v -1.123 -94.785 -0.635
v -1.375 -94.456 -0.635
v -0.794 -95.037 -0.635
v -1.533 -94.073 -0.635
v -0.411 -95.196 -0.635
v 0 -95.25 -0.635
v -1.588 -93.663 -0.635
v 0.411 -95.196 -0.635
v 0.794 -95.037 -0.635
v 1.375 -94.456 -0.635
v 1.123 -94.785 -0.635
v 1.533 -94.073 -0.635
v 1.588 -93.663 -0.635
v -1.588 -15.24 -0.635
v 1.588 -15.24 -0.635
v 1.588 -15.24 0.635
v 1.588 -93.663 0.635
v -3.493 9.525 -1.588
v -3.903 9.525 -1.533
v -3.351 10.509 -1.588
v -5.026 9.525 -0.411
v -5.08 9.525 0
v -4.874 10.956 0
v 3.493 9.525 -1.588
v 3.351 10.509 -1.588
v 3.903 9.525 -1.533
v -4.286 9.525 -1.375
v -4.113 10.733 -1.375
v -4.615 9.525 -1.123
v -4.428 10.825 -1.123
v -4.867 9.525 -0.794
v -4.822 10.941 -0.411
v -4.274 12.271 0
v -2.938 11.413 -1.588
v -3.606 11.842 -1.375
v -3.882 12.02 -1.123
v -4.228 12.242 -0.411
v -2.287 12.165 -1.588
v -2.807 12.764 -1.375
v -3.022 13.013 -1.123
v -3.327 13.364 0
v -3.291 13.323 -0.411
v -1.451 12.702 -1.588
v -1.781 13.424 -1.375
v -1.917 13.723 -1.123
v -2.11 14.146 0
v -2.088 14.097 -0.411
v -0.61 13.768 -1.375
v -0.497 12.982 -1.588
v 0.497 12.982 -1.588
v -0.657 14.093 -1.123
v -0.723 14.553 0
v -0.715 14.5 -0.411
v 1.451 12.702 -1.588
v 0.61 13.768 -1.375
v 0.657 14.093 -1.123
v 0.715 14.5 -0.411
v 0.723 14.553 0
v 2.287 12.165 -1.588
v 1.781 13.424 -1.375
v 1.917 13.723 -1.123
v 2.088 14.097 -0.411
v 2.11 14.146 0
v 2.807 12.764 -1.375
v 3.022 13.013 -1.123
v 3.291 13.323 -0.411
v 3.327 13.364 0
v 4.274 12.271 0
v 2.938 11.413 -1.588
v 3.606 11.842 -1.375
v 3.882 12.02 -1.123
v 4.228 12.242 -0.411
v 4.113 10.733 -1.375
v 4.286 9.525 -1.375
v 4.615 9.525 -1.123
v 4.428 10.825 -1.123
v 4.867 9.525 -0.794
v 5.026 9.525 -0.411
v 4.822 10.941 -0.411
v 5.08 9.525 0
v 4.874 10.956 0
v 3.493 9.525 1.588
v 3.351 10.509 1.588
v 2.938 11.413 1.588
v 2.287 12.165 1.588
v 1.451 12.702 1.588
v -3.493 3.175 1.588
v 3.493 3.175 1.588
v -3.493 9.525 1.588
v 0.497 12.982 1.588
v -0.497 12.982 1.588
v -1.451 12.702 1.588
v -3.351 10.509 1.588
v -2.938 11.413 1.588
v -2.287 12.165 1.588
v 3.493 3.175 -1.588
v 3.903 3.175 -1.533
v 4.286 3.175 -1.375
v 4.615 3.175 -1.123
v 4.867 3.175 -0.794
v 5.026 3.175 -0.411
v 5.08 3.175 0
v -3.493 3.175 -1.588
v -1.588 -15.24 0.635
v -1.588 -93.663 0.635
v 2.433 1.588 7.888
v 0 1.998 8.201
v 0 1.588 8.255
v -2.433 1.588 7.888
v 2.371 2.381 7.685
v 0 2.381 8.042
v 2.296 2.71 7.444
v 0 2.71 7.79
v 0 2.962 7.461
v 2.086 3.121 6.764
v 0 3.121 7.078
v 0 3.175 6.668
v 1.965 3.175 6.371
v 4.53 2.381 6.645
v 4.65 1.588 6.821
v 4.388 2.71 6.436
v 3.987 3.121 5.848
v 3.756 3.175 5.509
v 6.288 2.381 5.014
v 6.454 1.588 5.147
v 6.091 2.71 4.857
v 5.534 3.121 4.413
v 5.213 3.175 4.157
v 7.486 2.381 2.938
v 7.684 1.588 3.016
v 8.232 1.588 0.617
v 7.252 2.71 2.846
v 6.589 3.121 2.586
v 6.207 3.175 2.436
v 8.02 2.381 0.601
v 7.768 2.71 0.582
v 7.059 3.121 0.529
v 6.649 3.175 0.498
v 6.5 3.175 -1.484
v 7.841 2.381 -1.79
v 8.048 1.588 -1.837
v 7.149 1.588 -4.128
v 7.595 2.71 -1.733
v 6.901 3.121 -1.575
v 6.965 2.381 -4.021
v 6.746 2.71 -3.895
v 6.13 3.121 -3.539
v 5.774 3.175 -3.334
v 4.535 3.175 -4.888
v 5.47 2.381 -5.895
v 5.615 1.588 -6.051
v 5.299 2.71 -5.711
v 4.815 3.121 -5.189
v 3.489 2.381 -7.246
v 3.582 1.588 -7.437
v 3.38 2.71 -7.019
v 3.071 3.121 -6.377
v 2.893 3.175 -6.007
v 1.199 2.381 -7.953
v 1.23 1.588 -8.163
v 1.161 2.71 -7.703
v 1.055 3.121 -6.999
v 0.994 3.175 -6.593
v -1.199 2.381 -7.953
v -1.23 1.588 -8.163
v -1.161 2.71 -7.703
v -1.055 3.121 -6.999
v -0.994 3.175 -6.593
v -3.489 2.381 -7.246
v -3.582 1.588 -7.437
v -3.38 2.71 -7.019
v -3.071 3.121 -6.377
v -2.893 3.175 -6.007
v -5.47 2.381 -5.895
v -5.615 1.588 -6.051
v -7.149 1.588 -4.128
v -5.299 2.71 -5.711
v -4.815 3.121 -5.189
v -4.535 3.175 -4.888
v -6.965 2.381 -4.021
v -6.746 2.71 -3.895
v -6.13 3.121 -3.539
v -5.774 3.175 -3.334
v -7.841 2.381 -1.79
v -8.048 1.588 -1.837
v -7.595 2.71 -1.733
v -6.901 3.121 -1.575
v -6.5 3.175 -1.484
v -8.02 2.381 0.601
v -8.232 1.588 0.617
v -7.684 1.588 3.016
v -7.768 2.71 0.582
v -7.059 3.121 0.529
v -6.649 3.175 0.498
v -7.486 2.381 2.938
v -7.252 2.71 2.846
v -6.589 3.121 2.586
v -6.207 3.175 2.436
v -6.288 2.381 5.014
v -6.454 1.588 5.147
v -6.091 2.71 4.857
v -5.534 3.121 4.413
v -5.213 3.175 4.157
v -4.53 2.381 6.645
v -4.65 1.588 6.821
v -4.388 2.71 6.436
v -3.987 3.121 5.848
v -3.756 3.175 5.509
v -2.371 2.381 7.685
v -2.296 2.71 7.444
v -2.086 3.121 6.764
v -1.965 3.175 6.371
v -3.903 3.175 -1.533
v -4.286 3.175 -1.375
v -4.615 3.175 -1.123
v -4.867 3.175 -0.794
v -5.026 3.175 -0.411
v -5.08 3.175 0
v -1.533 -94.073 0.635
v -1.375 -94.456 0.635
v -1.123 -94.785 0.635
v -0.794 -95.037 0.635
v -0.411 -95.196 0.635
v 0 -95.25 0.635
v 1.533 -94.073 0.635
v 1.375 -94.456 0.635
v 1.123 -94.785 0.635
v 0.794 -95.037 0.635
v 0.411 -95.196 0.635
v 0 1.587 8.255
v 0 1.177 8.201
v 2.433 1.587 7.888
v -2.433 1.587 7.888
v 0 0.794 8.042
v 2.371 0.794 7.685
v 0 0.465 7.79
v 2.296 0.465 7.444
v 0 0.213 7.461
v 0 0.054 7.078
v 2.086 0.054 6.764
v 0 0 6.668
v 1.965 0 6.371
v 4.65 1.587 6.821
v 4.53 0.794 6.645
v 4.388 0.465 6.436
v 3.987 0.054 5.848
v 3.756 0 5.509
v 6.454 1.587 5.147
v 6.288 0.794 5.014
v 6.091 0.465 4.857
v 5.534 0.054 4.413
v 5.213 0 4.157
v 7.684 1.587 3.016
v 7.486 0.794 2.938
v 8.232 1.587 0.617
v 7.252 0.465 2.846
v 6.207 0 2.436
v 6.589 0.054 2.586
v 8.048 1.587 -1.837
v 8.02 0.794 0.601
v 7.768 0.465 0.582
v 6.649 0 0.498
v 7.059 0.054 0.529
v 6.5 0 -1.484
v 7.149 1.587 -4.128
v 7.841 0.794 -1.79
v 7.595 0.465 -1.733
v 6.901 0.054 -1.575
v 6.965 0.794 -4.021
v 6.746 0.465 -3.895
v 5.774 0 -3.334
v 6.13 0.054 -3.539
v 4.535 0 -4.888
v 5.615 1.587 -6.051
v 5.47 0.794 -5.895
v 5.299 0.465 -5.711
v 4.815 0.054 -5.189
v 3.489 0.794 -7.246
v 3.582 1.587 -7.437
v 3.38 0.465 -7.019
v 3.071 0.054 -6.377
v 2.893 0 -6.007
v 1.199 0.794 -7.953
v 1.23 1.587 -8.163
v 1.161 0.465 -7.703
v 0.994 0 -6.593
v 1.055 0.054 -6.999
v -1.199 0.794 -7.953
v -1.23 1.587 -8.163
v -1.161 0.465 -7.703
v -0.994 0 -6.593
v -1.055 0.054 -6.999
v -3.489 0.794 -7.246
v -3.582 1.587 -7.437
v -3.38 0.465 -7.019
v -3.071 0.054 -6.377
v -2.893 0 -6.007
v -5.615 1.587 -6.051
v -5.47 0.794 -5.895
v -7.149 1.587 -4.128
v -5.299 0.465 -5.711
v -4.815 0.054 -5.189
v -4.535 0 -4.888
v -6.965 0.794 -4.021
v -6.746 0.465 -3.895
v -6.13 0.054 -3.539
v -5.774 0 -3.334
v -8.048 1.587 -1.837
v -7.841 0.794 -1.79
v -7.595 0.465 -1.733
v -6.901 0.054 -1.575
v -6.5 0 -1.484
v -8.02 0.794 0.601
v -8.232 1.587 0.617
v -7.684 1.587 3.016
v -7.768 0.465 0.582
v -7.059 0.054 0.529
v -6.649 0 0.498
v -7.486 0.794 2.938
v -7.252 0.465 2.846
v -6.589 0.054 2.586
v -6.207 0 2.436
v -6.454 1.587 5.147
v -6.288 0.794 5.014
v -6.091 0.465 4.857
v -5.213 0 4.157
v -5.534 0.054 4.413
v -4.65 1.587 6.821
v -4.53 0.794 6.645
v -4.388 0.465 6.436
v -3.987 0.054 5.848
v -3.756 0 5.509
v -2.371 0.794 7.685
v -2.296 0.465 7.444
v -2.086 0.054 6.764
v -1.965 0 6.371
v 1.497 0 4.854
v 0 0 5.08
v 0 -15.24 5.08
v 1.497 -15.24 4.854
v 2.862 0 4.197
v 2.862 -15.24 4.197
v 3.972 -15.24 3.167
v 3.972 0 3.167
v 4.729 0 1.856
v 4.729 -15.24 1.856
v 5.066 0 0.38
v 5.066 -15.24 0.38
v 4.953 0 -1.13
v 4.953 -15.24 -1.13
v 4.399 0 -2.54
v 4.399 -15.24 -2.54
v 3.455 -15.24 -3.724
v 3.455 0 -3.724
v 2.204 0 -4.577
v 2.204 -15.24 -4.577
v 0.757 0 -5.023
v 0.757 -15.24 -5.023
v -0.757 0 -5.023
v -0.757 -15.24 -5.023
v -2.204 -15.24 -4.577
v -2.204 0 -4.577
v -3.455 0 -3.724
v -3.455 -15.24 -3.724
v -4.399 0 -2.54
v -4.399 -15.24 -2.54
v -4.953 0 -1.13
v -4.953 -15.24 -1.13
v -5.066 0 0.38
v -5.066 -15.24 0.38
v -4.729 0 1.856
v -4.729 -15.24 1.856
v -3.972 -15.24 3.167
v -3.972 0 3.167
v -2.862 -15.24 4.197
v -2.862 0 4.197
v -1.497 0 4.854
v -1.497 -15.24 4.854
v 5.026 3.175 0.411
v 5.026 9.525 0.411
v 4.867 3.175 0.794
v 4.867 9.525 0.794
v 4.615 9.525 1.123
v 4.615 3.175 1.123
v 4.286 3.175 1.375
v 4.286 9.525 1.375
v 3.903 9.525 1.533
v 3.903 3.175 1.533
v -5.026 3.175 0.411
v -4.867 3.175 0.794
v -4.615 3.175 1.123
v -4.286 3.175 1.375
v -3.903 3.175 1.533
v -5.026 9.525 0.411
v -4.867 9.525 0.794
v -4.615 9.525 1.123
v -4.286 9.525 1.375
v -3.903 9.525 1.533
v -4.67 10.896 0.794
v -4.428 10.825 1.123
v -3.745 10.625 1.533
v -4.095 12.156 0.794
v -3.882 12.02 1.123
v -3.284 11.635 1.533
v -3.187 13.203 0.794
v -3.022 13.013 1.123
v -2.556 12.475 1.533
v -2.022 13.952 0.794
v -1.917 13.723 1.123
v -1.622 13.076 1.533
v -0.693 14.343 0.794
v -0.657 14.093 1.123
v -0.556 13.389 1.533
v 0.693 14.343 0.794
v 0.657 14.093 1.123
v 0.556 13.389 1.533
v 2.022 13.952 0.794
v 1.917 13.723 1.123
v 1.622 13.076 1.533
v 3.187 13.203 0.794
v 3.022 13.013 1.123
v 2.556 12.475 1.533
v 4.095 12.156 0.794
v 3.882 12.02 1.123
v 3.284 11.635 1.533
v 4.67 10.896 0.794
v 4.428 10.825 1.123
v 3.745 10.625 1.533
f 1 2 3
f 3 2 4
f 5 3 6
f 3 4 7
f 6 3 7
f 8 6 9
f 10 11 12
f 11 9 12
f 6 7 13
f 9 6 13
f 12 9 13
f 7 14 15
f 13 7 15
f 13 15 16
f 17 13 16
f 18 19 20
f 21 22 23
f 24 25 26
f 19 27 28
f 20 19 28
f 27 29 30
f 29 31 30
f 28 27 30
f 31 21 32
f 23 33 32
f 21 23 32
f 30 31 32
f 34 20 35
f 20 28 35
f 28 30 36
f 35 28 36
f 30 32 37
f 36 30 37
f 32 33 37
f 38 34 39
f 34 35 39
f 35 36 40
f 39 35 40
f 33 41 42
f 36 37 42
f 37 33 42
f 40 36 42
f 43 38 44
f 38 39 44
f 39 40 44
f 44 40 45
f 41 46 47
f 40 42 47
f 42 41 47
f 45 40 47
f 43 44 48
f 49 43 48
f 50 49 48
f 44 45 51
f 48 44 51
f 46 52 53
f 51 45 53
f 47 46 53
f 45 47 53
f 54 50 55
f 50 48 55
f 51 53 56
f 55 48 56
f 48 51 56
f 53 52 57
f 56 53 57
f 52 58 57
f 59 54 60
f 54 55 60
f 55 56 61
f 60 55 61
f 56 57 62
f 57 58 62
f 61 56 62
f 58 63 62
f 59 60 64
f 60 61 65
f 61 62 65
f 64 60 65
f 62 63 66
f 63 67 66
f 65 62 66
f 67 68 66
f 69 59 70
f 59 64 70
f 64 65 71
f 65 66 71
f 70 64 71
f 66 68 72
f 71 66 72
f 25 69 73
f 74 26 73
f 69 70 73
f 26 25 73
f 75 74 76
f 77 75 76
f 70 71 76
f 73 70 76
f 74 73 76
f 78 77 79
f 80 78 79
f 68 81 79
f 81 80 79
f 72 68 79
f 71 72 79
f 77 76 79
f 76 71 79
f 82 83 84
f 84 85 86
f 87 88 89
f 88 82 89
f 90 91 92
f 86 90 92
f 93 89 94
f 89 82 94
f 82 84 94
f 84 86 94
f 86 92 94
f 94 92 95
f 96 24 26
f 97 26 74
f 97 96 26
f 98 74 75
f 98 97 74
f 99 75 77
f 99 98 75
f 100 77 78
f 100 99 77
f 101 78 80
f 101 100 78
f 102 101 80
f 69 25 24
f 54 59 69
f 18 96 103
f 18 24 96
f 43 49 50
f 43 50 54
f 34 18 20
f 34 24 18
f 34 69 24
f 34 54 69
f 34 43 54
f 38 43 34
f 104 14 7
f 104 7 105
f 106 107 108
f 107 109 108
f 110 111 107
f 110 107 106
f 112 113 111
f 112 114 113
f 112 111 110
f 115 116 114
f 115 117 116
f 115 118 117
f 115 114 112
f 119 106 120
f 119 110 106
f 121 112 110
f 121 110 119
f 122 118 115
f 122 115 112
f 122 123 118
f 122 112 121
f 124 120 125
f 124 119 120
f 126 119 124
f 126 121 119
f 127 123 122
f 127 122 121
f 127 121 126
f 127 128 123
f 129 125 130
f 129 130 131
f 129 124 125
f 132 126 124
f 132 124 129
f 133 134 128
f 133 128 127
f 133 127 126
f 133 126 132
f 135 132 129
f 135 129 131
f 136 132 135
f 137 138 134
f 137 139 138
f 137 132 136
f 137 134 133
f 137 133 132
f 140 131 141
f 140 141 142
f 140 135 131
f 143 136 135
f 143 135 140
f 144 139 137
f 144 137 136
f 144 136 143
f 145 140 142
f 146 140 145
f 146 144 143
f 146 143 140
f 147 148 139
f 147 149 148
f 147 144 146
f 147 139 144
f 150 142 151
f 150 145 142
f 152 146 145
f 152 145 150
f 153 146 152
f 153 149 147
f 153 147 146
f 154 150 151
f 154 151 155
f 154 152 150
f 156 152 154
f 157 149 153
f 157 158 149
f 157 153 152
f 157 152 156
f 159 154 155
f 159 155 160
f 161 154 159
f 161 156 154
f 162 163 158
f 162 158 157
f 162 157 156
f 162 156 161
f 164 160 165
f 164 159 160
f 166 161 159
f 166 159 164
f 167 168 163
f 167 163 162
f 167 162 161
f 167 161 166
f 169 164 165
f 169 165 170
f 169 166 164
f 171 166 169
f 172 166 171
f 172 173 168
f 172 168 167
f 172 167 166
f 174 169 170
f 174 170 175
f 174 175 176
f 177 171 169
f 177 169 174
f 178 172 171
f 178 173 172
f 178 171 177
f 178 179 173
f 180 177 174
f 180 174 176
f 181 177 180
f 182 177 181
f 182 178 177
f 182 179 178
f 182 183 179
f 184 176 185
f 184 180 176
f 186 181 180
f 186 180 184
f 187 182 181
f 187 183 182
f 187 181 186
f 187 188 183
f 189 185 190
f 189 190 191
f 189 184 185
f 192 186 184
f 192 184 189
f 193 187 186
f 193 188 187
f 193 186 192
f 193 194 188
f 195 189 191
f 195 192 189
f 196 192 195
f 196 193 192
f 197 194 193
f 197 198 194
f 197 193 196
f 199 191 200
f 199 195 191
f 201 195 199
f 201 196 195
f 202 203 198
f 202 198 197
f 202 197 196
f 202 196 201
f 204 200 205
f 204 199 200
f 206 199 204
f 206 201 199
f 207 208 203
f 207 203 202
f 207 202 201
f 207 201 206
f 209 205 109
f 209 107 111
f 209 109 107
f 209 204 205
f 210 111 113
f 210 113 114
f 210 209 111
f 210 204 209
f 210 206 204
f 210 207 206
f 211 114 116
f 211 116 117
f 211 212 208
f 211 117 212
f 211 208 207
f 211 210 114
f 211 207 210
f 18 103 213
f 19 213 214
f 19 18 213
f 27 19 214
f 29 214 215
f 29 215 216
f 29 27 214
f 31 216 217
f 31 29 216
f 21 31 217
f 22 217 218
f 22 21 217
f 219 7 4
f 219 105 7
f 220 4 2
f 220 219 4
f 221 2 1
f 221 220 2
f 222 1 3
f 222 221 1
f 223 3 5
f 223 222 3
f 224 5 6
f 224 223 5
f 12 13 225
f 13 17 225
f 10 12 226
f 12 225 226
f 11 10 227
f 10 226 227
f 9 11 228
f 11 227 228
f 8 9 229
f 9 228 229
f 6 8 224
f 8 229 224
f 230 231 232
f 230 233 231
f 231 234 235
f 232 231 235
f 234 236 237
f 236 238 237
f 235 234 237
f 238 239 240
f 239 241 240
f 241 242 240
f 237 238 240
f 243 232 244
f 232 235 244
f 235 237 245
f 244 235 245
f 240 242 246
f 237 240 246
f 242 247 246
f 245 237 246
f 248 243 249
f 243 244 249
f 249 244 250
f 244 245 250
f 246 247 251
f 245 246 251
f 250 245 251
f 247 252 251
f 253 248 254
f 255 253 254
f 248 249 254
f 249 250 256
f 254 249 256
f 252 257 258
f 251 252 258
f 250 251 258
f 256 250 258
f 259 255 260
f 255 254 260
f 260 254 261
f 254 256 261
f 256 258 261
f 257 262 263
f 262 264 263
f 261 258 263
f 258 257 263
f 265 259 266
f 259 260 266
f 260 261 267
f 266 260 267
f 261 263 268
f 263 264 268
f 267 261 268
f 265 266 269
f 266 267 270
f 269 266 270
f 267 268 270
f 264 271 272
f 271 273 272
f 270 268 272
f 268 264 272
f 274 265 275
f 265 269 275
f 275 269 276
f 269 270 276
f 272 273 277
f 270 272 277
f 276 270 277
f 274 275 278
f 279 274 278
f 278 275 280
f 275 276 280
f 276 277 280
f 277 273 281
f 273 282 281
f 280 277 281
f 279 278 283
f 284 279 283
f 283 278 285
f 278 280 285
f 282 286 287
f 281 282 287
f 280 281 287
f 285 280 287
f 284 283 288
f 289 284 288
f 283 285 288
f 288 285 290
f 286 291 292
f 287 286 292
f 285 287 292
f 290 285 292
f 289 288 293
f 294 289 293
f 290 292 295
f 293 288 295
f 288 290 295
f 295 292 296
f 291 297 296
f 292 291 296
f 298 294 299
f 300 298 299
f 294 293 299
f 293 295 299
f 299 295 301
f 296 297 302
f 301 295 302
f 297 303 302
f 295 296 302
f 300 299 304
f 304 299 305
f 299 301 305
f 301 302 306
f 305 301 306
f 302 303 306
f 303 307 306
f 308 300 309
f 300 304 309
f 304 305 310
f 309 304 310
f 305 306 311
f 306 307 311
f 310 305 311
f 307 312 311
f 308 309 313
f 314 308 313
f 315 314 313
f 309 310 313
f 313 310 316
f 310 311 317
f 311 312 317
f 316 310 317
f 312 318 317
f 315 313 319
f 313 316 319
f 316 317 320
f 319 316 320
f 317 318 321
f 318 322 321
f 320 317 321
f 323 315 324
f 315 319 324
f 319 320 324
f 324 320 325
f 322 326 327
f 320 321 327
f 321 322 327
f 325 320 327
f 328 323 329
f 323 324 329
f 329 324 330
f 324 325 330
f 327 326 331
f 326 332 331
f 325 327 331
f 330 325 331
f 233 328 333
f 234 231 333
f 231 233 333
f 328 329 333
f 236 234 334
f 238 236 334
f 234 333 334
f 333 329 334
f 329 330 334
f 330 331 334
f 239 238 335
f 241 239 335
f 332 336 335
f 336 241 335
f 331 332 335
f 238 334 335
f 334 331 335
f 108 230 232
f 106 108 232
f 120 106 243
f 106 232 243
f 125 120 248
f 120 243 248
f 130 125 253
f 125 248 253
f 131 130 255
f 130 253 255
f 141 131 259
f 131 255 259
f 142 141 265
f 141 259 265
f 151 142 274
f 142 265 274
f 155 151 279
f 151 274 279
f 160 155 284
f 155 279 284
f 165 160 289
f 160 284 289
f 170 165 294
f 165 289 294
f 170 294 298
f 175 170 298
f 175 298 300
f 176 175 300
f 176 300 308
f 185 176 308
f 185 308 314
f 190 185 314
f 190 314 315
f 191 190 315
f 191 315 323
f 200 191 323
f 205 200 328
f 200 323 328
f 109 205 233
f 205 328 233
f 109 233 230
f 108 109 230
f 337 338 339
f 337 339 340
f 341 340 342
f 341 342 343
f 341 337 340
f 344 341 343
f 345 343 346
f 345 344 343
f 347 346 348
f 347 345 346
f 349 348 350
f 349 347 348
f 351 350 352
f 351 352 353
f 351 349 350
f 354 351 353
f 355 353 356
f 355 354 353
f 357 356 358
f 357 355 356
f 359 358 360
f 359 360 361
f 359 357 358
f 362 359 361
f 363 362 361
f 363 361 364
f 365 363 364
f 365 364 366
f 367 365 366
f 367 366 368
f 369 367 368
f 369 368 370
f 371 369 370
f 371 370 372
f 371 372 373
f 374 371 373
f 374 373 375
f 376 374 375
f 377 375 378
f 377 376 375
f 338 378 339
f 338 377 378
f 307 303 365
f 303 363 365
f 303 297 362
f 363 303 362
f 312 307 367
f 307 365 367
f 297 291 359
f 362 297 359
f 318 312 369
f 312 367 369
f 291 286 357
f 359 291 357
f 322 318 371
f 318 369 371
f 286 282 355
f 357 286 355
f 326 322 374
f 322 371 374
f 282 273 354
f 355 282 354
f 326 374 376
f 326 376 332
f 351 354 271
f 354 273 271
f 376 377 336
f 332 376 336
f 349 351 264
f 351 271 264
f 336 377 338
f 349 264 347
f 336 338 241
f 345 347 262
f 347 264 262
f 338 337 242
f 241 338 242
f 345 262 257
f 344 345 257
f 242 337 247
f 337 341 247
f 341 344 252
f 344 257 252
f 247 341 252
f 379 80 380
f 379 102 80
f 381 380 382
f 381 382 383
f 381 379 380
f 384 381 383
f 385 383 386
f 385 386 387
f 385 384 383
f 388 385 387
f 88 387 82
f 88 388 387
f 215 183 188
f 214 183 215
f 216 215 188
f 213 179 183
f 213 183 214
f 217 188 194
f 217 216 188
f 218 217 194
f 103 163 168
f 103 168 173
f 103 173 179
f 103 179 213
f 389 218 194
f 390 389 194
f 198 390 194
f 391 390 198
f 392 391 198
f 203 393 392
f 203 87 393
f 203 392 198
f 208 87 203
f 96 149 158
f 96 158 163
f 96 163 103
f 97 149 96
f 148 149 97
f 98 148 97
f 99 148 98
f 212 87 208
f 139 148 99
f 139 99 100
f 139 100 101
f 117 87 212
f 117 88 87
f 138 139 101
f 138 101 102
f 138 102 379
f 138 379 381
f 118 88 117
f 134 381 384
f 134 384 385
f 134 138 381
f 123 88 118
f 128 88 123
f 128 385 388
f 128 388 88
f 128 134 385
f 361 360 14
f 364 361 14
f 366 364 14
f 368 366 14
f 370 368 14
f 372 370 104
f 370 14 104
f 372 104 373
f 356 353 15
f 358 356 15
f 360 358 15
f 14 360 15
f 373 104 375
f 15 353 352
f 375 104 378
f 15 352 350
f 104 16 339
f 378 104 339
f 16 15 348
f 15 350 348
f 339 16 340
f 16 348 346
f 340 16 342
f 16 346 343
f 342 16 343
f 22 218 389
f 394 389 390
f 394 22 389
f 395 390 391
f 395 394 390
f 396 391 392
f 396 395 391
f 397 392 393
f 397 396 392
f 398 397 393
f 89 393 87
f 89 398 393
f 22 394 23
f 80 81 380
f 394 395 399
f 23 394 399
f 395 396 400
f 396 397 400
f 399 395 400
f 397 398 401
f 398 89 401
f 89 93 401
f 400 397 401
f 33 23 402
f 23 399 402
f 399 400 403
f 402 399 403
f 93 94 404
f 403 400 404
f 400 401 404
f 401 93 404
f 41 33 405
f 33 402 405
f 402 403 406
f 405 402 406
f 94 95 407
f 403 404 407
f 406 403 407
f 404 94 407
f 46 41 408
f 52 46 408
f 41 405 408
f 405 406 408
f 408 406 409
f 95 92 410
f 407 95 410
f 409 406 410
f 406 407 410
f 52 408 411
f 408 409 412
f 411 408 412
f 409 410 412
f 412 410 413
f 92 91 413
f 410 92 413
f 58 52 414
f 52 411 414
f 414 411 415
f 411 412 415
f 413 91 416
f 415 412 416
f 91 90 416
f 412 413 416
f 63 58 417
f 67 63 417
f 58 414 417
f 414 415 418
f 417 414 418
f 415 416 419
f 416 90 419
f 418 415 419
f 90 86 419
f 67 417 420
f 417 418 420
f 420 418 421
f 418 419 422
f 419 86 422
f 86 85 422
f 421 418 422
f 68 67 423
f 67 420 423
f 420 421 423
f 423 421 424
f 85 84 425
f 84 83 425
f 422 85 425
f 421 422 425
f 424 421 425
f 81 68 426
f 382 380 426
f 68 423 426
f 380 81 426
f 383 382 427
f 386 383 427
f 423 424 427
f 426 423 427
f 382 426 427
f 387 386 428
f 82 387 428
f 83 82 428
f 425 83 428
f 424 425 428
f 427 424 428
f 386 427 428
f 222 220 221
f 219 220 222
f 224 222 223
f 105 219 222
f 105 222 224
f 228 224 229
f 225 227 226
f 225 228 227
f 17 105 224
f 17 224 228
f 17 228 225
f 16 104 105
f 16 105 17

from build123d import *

# Parameters (mm, degrees)
SKETCH1_R           = 5.08
BOSS_EXTRUDE1_DEPTH = 15.24
SKETCH2_R           = 8.255
BOSS_EXTRUDE2_DEPTH = 3.175
BOSS_EXTRUDE3_DEPTH = 1.5875
FILLET1_R           = 1.5875
SKETCH4_W           = 3.175
SKETCH4_H           = 1.27
BOSS_EXTRUDE4_DEPTH = 80.01
FILLET3_R           = 1.5875


with BuildPart() as part:
    # Sketch1 → Boss-Extrude1 (new body)
    with BuildSketch(Plane(origin=(0, 0, 0), x_dir=(1, 0, 0), z_dir=(0, 1, 0))):
        with Locations(Location((0, 0, 0), (0, 0, 270))):
            Circle(SKETCH1_R)
    extrude(amount=-BOSS_EXTRUDE1_DEPTH)

    # Sketch2 → Boss-Extrude2 (add)
    with BuildSketch(Plane(origin=(0, 0, 0), x_dir=(1, 0, 0), z_dir=(0, 1, 0))):
        with Locations(Location((0, 0, 0), (0, 0, 270))):
            Circle(SKETCH2_R)
    extrude(amount=BOSS_EXTRUDE2_DEPTH)

    # Sketch3 → Boss-Extrude3 (add, symmetric)
    with BuildSketch(Plane.XY):
        with BuildLine():
            Line((5.08, 3.175), (-5.08, 3.175))
            Line((-5.08, 3.175), (-5.08, 9.525))
            ThreePointArc((-5.08, 9.525), (0, 14.605), (5.08, 9.525))
            Line((5.08, 9.525), (5.08, 3.175))
        make_face()
    extrude(amount=BOSS_EXTRUDE3_DEPTH, both=True)

    # Fillet1
    fillet1_edges = [part.edges().sort_by_distance(p)[0] for p in [
        (5.08, 6.35, -1.5875),
        (-5.08, 6.35, -1.5875),
        (-5.08, 6.35, 1.5875),
        (0, 14.605, 1.5875),
        (0, 0, -8.255),
        (0, 3.175, -8.255),
        (0, 14.605, -1.5875),
        (5.08, 6.35, 1.5875),
    ]]
    fillet(fillet1_edges, radius=FILLET1_R - 0.0001)  # a hair under: the kernel refuses the full size

    # Sketch4 → Boss-Extrude4 (add)
    with BuildSketch(Plane.XZ.offset(15.24)):
        Rectangle(SKETCH4_W, SKETCH4_H)
    extrude(amount=BOSS_EXTRUDE4_DEPTH)

    # Fillet3
    fillet3_edges = [part.edges().sort_by_distance(p)[0] for p in [
        (-1.5875, -95.25, 0),
        (1.5875, -95.25, 0),
    ]]
    fillet(fillet3_edges, radius=FILLET3_R - 0.0001)  # a hair under: the kernel refuses the full size


solid = part.part
